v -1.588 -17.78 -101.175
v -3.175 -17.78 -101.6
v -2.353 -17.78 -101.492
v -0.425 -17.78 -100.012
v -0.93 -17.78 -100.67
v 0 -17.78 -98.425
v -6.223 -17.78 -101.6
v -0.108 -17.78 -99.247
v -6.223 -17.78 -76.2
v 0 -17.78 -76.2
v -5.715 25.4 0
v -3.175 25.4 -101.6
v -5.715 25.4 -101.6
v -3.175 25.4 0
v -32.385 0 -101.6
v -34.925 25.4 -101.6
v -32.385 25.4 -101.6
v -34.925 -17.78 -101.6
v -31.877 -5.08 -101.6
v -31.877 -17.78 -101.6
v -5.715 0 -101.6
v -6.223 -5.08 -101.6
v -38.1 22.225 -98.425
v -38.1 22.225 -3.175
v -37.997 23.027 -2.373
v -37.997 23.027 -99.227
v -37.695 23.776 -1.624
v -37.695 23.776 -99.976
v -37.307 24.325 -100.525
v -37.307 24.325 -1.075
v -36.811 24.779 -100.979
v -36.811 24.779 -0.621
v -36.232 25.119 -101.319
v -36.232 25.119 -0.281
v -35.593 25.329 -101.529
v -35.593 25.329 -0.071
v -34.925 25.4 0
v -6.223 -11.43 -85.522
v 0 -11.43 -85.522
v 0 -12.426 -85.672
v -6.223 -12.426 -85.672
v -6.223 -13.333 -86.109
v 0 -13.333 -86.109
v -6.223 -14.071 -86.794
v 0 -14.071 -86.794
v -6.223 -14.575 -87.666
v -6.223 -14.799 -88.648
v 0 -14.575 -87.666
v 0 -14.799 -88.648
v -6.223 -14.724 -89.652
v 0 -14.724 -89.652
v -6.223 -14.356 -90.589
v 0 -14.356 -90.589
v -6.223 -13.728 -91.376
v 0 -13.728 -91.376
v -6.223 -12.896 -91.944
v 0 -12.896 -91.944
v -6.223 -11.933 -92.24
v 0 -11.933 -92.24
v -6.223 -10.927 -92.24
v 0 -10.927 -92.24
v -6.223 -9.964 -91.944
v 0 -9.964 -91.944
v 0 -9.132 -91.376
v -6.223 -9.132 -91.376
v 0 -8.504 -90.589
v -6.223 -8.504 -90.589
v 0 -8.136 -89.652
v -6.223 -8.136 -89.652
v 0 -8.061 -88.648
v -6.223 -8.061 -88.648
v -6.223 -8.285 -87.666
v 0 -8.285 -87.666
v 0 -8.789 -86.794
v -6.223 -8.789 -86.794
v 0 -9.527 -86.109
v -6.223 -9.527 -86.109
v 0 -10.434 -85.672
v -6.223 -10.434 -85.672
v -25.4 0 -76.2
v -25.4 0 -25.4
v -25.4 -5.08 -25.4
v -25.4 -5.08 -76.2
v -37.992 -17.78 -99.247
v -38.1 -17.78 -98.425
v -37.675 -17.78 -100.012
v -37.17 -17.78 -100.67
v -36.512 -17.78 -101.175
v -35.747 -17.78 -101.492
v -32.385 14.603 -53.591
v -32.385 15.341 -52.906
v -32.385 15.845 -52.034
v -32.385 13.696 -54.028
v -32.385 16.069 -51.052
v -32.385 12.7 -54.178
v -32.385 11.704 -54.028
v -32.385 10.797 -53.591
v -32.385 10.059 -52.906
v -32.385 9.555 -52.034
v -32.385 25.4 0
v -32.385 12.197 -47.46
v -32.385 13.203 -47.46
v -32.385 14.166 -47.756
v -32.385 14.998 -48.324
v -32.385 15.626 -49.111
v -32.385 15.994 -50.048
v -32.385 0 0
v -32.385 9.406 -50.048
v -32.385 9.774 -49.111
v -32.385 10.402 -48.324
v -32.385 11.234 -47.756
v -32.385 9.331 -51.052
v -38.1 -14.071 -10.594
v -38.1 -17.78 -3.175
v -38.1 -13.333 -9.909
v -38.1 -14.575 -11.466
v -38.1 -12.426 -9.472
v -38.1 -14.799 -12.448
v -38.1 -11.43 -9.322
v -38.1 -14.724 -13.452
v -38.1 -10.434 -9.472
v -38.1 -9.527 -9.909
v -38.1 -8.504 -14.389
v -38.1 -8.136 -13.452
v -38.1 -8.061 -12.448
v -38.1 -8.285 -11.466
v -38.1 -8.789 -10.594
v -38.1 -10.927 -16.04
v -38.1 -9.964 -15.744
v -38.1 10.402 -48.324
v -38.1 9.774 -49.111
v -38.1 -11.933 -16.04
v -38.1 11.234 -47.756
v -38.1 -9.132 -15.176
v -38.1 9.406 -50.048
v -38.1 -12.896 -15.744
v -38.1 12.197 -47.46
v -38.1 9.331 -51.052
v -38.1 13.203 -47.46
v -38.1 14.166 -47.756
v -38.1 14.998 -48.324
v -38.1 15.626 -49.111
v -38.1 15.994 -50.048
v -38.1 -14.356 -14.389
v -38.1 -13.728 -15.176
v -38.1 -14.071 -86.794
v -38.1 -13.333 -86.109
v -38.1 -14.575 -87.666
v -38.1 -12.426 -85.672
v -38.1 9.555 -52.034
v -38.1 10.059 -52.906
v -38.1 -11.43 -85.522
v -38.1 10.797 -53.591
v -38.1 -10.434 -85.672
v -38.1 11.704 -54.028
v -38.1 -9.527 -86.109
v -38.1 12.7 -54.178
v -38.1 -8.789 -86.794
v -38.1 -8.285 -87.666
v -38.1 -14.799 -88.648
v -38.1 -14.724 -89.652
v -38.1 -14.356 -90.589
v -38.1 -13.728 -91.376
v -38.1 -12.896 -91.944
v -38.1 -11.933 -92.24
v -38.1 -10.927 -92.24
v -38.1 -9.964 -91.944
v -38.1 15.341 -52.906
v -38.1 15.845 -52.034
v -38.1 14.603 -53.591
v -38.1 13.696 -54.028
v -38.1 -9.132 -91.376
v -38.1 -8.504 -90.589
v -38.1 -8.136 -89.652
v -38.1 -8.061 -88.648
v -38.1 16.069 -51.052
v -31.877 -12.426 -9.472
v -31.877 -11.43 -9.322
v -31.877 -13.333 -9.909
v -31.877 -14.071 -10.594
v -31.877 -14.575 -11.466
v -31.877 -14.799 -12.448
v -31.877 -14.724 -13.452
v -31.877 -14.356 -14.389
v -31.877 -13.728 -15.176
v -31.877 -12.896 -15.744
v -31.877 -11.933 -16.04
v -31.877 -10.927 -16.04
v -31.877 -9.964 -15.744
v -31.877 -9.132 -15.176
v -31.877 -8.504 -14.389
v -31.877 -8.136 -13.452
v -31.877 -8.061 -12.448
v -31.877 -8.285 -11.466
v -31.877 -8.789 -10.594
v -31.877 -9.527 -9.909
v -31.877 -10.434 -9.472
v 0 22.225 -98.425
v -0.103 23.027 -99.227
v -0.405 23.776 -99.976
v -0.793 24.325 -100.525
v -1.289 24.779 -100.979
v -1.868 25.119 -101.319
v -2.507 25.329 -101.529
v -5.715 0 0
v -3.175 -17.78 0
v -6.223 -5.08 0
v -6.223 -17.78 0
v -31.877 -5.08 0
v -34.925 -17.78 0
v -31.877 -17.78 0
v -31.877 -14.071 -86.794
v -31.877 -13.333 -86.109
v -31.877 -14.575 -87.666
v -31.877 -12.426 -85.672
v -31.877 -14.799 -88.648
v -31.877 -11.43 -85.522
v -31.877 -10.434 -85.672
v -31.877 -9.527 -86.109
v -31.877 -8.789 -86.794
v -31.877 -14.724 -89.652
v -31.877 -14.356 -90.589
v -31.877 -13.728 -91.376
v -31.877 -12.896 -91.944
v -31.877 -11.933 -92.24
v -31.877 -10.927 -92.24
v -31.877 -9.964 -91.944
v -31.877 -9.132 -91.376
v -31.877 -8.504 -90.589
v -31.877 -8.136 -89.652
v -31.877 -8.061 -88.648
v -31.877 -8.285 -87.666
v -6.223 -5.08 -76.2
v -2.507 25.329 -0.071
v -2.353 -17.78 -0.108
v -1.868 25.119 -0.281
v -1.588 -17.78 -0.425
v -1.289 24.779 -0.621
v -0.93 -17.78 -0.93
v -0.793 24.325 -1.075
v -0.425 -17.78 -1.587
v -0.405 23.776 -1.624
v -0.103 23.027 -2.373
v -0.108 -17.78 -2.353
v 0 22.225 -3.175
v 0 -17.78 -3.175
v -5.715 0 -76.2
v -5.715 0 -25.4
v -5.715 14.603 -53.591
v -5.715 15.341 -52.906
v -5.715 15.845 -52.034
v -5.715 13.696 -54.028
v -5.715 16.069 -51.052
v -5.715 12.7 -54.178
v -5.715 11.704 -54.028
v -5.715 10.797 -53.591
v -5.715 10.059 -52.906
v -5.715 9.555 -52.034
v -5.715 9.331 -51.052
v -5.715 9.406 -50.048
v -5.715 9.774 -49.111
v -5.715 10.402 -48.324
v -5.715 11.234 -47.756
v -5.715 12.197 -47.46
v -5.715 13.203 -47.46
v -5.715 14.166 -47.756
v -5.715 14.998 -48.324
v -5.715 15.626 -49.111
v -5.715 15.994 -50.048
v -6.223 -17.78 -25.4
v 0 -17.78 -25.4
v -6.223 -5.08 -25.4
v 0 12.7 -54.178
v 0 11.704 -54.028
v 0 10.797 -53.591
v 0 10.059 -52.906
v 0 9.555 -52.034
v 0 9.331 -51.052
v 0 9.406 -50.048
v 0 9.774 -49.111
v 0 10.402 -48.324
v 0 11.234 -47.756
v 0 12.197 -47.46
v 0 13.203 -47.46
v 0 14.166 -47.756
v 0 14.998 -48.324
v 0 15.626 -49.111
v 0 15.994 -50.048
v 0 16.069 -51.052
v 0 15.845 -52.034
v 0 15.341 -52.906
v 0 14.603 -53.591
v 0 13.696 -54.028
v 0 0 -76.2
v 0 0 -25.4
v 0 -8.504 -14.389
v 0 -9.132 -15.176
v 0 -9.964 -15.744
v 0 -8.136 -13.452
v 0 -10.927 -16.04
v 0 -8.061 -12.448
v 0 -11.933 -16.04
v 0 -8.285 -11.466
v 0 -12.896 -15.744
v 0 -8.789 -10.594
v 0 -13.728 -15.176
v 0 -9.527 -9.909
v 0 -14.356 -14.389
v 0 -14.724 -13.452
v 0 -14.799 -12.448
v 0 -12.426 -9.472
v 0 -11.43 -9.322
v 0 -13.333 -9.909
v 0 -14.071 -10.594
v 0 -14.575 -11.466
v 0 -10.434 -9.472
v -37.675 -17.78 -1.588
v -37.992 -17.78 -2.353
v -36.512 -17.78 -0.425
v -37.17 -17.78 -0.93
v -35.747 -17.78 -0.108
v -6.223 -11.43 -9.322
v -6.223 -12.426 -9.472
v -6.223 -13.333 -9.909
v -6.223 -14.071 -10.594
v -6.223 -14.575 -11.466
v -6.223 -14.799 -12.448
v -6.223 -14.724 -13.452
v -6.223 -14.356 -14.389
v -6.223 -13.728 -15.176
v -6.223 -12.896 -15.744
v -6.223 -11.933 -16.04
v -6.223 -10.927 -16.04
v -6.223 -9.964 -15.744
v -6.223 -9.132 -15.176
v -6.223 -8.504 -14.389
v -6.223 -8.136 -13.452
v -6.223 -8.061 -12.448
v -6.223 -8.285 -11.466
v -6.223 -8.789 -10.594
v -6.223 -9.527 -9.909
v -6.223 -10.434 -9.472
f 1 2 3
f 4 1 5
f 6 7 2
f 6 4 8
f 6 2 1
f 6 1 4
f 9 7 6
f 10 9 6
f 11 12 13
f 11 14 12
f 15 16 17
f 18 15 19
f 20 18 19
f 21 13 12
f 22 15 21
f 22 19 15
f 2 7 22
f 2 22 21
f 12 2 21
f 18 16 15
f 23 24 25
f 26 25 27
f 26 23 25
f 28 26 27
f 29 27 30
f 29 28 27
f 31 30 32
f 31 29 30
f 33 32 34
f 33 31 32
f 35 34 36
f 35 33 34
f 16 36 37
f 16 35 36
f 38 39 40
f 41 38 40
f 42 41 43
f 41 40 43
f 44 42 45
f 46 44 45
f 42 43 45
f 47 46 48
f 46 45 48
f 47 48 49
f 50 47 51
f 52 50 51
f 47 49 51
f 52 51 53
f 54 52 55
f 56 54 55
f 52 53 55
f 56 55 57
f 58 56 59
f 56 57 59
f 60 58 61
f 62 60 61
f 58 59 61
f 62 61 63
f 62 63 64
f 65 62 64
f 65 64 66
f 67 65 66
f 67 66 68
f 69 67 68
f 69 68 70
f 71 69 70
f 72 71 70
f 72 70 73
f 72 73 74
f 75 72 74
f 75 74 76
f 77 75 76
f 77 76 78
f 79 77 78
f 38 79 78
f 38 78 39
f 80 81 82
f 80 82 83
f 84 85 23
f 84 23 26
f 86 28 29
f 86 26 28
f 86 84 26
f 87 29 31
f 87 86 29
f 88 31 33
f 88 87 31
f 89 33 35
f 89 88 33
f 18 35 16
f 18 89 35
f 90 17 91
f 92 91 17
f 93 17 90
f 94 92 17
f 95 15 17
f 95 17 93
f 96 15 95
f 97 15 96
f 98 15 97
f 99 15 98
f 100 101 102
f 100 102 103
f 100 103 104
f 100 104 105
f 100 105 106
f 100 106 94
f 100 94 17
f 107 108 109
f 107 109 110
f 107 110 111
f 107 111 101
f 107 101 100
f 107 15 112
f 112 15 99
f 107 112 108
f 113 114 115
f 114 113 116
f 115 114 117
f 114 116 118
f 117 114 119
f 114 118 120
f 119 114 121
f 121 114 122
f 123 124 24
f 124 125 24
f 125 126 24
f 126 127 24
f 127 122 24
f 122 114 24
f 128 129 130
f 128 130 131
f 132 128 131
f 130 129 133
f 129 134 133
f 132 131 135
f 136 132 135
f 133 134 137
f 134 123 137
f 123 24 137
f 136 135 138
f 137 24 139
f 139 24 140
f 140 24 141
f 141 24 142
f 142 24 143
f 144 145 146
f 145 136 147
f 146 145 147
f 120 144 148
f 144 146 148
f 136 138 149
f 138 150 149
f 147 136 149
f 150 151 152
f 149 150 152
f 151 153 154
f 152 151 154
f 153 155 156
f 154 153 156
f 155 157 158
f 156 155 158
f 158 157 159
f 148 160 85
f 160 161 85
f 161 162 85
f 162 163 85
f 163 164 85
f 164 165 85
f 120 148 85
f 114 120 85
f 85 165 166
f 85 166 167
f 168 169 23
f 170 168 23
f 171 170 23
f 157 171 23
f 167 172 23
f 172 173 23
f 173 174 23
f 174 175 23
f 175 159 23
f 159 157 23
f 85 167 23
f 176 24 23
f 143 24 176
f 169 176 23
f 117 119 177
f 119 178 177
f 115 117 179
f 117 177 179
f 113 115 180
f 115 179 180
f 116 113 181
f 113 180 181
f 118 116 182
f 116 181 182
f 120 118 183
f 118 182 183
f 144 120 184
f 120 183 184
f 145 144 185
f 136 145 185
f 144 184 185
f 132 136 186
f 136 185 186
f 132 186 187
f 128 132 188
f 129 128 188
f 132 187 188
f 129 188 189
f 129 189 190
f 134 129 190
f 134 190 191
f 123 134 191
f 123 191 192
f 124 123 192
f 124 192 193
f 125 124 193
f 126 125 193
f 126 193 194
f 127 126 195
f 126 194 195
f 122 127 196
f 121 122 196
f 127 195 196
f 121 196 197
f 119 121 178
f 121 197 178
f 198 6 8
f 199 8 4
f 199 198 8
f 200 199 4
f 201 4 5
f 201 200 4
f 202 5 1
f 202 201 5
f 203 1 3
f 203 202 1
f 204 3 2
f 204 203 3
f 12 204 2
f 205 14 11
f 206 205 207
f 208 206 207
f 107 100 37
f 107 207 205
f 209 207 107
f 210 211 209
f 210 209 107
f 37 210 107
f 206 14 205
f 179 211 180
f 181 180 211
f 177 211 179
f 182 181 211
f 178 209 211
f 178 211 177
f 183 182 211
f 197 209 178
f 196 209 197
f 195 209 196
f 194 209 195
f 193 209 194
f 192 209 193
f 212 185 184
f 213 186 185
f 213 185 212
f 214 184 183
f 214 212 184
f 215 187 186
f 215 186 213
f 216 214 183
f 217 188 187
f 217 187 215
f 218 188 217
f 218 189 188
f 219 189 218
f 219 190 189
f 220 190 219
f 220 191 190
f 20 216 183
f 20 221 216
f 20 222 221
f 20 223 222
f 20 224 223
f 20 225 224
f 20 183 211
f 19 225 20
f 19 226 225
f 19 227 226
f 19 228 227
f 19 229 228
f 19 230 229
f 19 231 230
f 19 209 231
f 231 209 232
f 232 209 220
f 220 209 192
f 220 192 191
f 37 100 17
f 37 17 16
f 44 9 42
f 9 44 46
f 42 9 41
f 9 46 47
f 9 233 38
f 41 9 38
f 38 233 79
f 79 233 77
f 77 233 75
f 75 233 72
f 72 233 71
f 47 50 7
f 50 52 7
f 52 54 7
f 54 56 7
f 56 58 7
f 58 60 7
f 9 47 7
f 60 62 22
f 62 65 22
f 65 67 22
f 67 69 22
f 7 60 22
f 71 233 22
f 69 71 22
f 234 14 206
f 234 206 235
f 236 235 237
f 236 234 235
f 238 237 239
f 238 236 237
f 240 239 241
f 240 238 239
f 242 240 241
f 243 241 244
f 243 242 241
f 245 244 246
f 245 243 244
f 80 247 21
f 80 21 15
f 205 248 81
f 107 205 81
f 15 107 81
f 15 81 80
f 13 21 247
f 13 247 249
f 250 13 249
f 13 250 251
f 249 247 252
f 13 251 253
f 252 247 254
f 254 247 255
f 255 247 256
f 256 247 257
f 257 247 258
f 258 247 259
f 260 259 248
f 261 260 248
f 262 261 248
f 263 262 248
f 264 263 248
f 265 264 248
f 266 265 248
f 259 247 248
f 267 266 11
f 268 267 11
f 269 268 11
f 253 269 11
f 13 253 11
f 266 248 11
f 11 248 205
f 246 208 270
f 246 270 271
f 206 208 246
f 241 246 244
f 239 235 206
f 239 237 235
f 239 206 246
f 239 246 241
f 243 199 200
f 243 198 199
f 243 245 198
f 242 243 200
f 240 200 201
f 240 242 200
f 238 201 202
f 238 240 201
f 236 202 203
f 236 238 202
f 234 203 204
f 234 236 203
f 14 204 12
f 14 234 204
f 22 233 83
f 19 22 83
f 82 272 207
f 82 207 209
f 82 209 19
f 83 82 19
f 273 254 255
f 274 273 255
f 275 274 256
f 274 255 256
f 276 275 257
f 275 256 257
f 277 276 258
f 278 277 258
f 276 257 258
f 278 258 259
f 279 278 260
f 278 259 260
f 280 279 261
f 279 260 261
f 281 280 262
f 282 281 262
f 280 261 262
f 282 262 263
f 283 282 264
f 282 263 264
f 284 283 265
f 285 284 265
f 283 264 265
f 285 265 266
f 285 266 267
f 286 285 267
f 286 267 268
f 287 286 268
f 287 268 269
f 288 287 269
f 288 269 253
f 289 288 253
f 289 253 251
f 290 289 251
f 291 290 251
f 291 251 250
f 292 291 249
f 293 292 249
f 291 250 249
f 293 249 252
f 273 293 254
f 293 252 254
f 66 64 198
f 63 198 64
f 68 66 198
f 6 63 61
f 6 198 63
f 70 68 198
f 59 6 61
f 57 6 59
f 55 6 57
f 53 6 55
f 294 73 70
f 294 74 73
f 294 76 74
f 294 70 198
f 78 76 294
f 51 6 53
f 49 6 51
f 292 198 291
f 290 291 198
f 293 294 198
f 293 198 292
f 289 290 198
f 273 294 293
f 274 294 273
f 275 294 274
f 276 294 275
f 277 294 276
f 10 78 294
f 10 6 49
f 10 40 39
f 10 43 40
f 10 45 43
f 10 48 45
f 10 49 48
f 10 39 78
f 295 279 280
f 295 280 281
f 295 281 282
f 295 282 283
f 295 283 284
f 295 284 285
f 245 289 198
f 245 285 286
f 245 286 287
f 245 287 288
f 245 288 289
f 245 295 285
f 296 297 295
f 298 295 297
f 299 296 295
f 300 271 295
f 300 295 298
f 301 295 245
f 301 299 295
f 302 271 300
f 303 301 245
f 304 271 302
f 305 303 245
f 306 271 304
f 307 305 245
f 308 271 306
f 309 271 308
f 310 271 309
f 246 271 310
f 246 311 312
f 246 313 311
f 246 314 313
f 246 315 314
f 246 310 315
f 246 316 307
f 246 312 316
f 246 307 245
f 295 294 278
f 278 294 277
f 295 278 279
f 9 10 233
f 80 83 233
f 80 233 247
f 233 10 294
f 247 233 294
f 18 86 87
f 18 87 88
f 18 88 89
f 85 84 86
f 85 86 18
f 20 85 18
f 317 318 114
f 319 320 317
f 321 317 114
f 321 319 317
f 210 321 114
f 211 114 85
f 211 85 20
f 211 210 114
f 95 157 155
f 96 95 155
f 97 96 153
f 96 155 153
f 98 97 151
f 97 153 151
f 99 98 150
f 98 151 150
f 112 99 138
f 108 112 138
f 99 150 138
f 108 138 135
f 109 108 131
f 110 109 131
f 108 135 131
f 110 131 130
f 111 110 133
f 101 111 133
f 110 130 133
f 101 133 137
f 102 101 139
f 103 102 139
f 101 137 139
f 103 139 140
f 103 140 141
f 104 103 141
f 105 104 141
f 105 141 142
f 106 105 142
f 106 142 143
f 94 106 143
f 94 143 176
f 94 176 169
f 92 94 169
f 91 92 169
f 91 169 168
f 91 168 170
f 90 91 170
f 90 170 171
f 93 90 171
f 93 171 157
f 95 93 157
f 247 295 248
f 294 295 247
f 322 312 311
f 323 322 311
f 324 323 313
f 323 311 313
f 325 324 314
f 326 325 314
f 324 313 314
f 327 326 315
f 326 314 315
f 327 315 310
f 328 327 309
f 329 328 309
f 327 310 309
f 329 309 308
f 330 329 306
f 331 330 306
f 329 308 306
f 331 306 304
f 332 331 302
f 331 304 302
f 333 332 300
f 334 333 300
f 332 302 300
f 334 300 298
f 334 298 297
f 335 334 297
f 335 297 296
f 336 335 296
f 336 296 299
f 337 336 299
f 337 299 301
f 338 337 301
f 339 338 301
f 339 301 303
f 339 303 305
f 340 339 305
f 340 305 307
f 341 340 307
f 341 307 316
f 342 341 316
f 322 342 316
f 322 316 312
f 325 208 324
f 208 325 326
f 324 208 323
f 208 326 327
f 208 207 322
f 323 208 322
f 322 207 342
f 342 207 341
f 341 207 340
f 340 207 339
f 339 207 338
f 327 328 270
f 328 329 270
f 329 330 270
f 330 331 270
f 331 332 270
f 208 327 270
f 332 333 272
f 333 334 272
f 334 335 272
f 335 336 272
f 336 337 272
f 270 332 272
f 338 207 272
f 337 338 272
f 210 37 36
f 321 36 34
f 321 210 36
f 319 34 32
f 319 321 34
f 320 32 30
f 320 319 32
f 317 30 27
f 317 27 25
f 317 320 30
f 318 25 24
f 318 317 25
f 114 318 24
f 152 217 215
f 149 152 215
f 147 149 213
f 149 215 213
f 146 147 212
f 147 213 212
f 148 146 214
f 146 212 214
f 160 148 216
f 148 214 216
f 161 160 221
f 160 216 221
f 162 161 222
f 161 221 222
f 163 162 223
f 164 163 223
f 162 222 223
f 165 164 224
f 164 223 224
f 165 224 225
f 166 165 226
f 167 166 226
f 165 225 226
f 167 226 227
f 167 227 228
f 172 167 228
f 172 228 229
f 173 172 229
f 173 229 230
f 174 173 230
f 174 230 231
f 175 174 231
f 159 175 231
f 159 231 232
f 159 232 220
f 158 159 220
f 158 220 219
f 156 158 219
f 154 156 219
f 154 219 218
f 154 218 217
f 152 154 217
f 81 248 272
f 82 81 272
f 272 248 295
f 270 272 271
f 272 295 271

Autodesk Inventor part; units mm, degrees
ref_plane "YZ Plane" through (0, 0, 0) normal (1, 0, 0) x (0, 1, 0)
ref_plane "XZ Plane" through (0, 0, 0) normal (0, 1, 0) x (-1, 0, 0)
ref_plane "XY Plane" through (0, 0, 0) normal (0, 0, 1) x (1, 0, 0)
sketch "Sketch1" plane through (0, 0, 0) normal (0, 1, 0) x (-1, 0, 0)
  line L0 (0, 0) -> (38.1, 0)
  line L1 (38.1, 0) -> (38.1, -101.6)
  line L2 (38.1, -101.6) -> (0, -101.6)
  line L3 (0, -101.6) -> (0, 0)
  line L4 (38.1, -101.6) -> (32.385, -101.6)
  line L5 (32.385, -101.6) -> (32.385, 0)
  line L6 (32.385, 0) -> (38.1, 0)
  line L7 (38.1, 0) -> (38.1, -101.6)
  line L8 (0, -101.6) -> (5.715, -101.6)
  line L9 (5.715, -101.6) -> (5.715, 0)
  line L10 (5.715, 0) -> (0, 0)
  line L11 (0, 0) -> (0, -101.6)
  dimension "d0" = 38.1
  dimension "d1" = 101.6
  dimension "d2" = 5.715
  dimension "d3" = 5.715
extrude "Extrusion1" add sketch "Sketch1" along normal blind 25.4 contours L0 L9 L2 L3 | L0 L1 L2 L5
extrude "Extrusion2" add sketch "Sketch1" against normal blind 5.08
sketch "Sketch2" plane through (0, 25.4, 0) normal (1, 0, 0) x (0, 0, -1)
  line L0 (101.6, 0) -> (0, 0) projected
  line L1 (50.8, 0) -> (50.8, -12.7)
  point P0 (0, -25.4)
  dimension "d8" = 12.7
hole "Hole1" at (0, 12.7, -50.8) direction (-1, 0, 0) diameter 6.7564 end through all clearance for "Socket Head Cap Screw" size "1/4" standard "Ansi Unified Screw Threads"
sketch "Sketch3" plane through (0, -5.08, 0) normal (0, -1, 0) x (1, 0, 0)
  line L0 (0, 0) -> (0, -101.6) projected
  line L1 (0, 0) -> (-6.223, 0)
  line L2 (-6.223, 0) -> (-6.223, -101.6)
  line L3 (-6.223, -101.6) -> (0, -101.6)
  line L4 (0, -101.6) -> (0, 0)
  line L5 (-38.1, -101.6) -> (-38.1, 0) projected
  line L6 (-38.1, 0) -> (-31.877, 0)
  line L7 (-31.877, 0) -> (-31.877, -101.6)
  line L8 (-31.877, -101.6) -> (-38.1, -101.6)
  line L9 (-38.1, -101.6) -> (-38.1, 0)
  dimension "d16" = 6.223
  dimension "d17" = 101.6
  dimension "d18" = 6.223
extrude "Extrusion3" add sketch "Sketch3" along normal blind 12.7
sketch "Sketch4" plane through (-38.1, 25.4, -101.6) normal (-1, 0, 0) x (0, 0, 1)
  line L0 (101.6, -43.18) -> (101.6, 0) projected
  line L1 (101.6, -43.18) -> (88.9, -43.18)
  line L2 (88.9, -43.18) -> (88.9, -36.83)
  line L3 (88.9, -36.83) -> (101.6, -36.83)
  line L4 (101.6, -36.83) -> (101.6, -43.18)
  line L5 (0, -43.18) -> (0, 0) projected
  line L6 (0, -43.18) -> (12.7, -43.18)
  line L7 (12.7, -43.18) -> (12.7, -36.83)
  line L8 (12.7, -36.83) -> (0, -36.83)
  line L9 (0, -36.83) -> (0, -43.18)
  point P0 (101.6, -25.4)
  dimension "d21" = 12.7
  dimension "d22" = 6.35
  dimension "d23" = 12.7
hole "Hole2" at (-38.1, -11.43, -12.7) at (-38.1, -11.43, -88.9) direction (1, 0, 0) diameter 6.7564 end through all clearance for "Socket Head Cap Screw" size "1/4" standard "Ansi Unified Screw Threads"
fillet "Fillet1" radius 3.175 6 edges at (-38.1, 3.81, 0) (-38.1, 25.4, -50.8) (0, 3.81, 0) (0, 25.4, -50.8) (0, 3.81, -101.6) (-38.1, 3.81, -101.6)
sketch "Sketch5" plane through (0, -17.78, -98.425) normal (1, 0, 0) x (0, 0, -1)
  line L0 (-95.25, 0) -> (0, 0) projected
  line L1 (-47.625, 0) -> (-47.625, 17.78)
  line L2 (-47.625, 17.78) -> (-47.625, 8.89)
  line L3 (-98.425, 17.78) -> (3.175, 17.78) projected
  line L4 (-73.025, 0) -> (-22.225, 0)
  line L5 (-22.225, 0) -> (-22.225, 17.78)
  line L6 (-22.225, 17.78) -> (-73.025, 17.78)
  line L7 (-73.025, 17.78) -> (-73.025, 0)
  line L8 (-73.025, 0) -> (-22.225, 17.78) construction
  line L9 (-22.225, 0) -> (-73.025, 17.78) construction
  dimension "d32" = 50.8
extrude "Extrusion4" cut sketch "Sketch5" against normal blind 25.4
properties part number "Rail Clip"
